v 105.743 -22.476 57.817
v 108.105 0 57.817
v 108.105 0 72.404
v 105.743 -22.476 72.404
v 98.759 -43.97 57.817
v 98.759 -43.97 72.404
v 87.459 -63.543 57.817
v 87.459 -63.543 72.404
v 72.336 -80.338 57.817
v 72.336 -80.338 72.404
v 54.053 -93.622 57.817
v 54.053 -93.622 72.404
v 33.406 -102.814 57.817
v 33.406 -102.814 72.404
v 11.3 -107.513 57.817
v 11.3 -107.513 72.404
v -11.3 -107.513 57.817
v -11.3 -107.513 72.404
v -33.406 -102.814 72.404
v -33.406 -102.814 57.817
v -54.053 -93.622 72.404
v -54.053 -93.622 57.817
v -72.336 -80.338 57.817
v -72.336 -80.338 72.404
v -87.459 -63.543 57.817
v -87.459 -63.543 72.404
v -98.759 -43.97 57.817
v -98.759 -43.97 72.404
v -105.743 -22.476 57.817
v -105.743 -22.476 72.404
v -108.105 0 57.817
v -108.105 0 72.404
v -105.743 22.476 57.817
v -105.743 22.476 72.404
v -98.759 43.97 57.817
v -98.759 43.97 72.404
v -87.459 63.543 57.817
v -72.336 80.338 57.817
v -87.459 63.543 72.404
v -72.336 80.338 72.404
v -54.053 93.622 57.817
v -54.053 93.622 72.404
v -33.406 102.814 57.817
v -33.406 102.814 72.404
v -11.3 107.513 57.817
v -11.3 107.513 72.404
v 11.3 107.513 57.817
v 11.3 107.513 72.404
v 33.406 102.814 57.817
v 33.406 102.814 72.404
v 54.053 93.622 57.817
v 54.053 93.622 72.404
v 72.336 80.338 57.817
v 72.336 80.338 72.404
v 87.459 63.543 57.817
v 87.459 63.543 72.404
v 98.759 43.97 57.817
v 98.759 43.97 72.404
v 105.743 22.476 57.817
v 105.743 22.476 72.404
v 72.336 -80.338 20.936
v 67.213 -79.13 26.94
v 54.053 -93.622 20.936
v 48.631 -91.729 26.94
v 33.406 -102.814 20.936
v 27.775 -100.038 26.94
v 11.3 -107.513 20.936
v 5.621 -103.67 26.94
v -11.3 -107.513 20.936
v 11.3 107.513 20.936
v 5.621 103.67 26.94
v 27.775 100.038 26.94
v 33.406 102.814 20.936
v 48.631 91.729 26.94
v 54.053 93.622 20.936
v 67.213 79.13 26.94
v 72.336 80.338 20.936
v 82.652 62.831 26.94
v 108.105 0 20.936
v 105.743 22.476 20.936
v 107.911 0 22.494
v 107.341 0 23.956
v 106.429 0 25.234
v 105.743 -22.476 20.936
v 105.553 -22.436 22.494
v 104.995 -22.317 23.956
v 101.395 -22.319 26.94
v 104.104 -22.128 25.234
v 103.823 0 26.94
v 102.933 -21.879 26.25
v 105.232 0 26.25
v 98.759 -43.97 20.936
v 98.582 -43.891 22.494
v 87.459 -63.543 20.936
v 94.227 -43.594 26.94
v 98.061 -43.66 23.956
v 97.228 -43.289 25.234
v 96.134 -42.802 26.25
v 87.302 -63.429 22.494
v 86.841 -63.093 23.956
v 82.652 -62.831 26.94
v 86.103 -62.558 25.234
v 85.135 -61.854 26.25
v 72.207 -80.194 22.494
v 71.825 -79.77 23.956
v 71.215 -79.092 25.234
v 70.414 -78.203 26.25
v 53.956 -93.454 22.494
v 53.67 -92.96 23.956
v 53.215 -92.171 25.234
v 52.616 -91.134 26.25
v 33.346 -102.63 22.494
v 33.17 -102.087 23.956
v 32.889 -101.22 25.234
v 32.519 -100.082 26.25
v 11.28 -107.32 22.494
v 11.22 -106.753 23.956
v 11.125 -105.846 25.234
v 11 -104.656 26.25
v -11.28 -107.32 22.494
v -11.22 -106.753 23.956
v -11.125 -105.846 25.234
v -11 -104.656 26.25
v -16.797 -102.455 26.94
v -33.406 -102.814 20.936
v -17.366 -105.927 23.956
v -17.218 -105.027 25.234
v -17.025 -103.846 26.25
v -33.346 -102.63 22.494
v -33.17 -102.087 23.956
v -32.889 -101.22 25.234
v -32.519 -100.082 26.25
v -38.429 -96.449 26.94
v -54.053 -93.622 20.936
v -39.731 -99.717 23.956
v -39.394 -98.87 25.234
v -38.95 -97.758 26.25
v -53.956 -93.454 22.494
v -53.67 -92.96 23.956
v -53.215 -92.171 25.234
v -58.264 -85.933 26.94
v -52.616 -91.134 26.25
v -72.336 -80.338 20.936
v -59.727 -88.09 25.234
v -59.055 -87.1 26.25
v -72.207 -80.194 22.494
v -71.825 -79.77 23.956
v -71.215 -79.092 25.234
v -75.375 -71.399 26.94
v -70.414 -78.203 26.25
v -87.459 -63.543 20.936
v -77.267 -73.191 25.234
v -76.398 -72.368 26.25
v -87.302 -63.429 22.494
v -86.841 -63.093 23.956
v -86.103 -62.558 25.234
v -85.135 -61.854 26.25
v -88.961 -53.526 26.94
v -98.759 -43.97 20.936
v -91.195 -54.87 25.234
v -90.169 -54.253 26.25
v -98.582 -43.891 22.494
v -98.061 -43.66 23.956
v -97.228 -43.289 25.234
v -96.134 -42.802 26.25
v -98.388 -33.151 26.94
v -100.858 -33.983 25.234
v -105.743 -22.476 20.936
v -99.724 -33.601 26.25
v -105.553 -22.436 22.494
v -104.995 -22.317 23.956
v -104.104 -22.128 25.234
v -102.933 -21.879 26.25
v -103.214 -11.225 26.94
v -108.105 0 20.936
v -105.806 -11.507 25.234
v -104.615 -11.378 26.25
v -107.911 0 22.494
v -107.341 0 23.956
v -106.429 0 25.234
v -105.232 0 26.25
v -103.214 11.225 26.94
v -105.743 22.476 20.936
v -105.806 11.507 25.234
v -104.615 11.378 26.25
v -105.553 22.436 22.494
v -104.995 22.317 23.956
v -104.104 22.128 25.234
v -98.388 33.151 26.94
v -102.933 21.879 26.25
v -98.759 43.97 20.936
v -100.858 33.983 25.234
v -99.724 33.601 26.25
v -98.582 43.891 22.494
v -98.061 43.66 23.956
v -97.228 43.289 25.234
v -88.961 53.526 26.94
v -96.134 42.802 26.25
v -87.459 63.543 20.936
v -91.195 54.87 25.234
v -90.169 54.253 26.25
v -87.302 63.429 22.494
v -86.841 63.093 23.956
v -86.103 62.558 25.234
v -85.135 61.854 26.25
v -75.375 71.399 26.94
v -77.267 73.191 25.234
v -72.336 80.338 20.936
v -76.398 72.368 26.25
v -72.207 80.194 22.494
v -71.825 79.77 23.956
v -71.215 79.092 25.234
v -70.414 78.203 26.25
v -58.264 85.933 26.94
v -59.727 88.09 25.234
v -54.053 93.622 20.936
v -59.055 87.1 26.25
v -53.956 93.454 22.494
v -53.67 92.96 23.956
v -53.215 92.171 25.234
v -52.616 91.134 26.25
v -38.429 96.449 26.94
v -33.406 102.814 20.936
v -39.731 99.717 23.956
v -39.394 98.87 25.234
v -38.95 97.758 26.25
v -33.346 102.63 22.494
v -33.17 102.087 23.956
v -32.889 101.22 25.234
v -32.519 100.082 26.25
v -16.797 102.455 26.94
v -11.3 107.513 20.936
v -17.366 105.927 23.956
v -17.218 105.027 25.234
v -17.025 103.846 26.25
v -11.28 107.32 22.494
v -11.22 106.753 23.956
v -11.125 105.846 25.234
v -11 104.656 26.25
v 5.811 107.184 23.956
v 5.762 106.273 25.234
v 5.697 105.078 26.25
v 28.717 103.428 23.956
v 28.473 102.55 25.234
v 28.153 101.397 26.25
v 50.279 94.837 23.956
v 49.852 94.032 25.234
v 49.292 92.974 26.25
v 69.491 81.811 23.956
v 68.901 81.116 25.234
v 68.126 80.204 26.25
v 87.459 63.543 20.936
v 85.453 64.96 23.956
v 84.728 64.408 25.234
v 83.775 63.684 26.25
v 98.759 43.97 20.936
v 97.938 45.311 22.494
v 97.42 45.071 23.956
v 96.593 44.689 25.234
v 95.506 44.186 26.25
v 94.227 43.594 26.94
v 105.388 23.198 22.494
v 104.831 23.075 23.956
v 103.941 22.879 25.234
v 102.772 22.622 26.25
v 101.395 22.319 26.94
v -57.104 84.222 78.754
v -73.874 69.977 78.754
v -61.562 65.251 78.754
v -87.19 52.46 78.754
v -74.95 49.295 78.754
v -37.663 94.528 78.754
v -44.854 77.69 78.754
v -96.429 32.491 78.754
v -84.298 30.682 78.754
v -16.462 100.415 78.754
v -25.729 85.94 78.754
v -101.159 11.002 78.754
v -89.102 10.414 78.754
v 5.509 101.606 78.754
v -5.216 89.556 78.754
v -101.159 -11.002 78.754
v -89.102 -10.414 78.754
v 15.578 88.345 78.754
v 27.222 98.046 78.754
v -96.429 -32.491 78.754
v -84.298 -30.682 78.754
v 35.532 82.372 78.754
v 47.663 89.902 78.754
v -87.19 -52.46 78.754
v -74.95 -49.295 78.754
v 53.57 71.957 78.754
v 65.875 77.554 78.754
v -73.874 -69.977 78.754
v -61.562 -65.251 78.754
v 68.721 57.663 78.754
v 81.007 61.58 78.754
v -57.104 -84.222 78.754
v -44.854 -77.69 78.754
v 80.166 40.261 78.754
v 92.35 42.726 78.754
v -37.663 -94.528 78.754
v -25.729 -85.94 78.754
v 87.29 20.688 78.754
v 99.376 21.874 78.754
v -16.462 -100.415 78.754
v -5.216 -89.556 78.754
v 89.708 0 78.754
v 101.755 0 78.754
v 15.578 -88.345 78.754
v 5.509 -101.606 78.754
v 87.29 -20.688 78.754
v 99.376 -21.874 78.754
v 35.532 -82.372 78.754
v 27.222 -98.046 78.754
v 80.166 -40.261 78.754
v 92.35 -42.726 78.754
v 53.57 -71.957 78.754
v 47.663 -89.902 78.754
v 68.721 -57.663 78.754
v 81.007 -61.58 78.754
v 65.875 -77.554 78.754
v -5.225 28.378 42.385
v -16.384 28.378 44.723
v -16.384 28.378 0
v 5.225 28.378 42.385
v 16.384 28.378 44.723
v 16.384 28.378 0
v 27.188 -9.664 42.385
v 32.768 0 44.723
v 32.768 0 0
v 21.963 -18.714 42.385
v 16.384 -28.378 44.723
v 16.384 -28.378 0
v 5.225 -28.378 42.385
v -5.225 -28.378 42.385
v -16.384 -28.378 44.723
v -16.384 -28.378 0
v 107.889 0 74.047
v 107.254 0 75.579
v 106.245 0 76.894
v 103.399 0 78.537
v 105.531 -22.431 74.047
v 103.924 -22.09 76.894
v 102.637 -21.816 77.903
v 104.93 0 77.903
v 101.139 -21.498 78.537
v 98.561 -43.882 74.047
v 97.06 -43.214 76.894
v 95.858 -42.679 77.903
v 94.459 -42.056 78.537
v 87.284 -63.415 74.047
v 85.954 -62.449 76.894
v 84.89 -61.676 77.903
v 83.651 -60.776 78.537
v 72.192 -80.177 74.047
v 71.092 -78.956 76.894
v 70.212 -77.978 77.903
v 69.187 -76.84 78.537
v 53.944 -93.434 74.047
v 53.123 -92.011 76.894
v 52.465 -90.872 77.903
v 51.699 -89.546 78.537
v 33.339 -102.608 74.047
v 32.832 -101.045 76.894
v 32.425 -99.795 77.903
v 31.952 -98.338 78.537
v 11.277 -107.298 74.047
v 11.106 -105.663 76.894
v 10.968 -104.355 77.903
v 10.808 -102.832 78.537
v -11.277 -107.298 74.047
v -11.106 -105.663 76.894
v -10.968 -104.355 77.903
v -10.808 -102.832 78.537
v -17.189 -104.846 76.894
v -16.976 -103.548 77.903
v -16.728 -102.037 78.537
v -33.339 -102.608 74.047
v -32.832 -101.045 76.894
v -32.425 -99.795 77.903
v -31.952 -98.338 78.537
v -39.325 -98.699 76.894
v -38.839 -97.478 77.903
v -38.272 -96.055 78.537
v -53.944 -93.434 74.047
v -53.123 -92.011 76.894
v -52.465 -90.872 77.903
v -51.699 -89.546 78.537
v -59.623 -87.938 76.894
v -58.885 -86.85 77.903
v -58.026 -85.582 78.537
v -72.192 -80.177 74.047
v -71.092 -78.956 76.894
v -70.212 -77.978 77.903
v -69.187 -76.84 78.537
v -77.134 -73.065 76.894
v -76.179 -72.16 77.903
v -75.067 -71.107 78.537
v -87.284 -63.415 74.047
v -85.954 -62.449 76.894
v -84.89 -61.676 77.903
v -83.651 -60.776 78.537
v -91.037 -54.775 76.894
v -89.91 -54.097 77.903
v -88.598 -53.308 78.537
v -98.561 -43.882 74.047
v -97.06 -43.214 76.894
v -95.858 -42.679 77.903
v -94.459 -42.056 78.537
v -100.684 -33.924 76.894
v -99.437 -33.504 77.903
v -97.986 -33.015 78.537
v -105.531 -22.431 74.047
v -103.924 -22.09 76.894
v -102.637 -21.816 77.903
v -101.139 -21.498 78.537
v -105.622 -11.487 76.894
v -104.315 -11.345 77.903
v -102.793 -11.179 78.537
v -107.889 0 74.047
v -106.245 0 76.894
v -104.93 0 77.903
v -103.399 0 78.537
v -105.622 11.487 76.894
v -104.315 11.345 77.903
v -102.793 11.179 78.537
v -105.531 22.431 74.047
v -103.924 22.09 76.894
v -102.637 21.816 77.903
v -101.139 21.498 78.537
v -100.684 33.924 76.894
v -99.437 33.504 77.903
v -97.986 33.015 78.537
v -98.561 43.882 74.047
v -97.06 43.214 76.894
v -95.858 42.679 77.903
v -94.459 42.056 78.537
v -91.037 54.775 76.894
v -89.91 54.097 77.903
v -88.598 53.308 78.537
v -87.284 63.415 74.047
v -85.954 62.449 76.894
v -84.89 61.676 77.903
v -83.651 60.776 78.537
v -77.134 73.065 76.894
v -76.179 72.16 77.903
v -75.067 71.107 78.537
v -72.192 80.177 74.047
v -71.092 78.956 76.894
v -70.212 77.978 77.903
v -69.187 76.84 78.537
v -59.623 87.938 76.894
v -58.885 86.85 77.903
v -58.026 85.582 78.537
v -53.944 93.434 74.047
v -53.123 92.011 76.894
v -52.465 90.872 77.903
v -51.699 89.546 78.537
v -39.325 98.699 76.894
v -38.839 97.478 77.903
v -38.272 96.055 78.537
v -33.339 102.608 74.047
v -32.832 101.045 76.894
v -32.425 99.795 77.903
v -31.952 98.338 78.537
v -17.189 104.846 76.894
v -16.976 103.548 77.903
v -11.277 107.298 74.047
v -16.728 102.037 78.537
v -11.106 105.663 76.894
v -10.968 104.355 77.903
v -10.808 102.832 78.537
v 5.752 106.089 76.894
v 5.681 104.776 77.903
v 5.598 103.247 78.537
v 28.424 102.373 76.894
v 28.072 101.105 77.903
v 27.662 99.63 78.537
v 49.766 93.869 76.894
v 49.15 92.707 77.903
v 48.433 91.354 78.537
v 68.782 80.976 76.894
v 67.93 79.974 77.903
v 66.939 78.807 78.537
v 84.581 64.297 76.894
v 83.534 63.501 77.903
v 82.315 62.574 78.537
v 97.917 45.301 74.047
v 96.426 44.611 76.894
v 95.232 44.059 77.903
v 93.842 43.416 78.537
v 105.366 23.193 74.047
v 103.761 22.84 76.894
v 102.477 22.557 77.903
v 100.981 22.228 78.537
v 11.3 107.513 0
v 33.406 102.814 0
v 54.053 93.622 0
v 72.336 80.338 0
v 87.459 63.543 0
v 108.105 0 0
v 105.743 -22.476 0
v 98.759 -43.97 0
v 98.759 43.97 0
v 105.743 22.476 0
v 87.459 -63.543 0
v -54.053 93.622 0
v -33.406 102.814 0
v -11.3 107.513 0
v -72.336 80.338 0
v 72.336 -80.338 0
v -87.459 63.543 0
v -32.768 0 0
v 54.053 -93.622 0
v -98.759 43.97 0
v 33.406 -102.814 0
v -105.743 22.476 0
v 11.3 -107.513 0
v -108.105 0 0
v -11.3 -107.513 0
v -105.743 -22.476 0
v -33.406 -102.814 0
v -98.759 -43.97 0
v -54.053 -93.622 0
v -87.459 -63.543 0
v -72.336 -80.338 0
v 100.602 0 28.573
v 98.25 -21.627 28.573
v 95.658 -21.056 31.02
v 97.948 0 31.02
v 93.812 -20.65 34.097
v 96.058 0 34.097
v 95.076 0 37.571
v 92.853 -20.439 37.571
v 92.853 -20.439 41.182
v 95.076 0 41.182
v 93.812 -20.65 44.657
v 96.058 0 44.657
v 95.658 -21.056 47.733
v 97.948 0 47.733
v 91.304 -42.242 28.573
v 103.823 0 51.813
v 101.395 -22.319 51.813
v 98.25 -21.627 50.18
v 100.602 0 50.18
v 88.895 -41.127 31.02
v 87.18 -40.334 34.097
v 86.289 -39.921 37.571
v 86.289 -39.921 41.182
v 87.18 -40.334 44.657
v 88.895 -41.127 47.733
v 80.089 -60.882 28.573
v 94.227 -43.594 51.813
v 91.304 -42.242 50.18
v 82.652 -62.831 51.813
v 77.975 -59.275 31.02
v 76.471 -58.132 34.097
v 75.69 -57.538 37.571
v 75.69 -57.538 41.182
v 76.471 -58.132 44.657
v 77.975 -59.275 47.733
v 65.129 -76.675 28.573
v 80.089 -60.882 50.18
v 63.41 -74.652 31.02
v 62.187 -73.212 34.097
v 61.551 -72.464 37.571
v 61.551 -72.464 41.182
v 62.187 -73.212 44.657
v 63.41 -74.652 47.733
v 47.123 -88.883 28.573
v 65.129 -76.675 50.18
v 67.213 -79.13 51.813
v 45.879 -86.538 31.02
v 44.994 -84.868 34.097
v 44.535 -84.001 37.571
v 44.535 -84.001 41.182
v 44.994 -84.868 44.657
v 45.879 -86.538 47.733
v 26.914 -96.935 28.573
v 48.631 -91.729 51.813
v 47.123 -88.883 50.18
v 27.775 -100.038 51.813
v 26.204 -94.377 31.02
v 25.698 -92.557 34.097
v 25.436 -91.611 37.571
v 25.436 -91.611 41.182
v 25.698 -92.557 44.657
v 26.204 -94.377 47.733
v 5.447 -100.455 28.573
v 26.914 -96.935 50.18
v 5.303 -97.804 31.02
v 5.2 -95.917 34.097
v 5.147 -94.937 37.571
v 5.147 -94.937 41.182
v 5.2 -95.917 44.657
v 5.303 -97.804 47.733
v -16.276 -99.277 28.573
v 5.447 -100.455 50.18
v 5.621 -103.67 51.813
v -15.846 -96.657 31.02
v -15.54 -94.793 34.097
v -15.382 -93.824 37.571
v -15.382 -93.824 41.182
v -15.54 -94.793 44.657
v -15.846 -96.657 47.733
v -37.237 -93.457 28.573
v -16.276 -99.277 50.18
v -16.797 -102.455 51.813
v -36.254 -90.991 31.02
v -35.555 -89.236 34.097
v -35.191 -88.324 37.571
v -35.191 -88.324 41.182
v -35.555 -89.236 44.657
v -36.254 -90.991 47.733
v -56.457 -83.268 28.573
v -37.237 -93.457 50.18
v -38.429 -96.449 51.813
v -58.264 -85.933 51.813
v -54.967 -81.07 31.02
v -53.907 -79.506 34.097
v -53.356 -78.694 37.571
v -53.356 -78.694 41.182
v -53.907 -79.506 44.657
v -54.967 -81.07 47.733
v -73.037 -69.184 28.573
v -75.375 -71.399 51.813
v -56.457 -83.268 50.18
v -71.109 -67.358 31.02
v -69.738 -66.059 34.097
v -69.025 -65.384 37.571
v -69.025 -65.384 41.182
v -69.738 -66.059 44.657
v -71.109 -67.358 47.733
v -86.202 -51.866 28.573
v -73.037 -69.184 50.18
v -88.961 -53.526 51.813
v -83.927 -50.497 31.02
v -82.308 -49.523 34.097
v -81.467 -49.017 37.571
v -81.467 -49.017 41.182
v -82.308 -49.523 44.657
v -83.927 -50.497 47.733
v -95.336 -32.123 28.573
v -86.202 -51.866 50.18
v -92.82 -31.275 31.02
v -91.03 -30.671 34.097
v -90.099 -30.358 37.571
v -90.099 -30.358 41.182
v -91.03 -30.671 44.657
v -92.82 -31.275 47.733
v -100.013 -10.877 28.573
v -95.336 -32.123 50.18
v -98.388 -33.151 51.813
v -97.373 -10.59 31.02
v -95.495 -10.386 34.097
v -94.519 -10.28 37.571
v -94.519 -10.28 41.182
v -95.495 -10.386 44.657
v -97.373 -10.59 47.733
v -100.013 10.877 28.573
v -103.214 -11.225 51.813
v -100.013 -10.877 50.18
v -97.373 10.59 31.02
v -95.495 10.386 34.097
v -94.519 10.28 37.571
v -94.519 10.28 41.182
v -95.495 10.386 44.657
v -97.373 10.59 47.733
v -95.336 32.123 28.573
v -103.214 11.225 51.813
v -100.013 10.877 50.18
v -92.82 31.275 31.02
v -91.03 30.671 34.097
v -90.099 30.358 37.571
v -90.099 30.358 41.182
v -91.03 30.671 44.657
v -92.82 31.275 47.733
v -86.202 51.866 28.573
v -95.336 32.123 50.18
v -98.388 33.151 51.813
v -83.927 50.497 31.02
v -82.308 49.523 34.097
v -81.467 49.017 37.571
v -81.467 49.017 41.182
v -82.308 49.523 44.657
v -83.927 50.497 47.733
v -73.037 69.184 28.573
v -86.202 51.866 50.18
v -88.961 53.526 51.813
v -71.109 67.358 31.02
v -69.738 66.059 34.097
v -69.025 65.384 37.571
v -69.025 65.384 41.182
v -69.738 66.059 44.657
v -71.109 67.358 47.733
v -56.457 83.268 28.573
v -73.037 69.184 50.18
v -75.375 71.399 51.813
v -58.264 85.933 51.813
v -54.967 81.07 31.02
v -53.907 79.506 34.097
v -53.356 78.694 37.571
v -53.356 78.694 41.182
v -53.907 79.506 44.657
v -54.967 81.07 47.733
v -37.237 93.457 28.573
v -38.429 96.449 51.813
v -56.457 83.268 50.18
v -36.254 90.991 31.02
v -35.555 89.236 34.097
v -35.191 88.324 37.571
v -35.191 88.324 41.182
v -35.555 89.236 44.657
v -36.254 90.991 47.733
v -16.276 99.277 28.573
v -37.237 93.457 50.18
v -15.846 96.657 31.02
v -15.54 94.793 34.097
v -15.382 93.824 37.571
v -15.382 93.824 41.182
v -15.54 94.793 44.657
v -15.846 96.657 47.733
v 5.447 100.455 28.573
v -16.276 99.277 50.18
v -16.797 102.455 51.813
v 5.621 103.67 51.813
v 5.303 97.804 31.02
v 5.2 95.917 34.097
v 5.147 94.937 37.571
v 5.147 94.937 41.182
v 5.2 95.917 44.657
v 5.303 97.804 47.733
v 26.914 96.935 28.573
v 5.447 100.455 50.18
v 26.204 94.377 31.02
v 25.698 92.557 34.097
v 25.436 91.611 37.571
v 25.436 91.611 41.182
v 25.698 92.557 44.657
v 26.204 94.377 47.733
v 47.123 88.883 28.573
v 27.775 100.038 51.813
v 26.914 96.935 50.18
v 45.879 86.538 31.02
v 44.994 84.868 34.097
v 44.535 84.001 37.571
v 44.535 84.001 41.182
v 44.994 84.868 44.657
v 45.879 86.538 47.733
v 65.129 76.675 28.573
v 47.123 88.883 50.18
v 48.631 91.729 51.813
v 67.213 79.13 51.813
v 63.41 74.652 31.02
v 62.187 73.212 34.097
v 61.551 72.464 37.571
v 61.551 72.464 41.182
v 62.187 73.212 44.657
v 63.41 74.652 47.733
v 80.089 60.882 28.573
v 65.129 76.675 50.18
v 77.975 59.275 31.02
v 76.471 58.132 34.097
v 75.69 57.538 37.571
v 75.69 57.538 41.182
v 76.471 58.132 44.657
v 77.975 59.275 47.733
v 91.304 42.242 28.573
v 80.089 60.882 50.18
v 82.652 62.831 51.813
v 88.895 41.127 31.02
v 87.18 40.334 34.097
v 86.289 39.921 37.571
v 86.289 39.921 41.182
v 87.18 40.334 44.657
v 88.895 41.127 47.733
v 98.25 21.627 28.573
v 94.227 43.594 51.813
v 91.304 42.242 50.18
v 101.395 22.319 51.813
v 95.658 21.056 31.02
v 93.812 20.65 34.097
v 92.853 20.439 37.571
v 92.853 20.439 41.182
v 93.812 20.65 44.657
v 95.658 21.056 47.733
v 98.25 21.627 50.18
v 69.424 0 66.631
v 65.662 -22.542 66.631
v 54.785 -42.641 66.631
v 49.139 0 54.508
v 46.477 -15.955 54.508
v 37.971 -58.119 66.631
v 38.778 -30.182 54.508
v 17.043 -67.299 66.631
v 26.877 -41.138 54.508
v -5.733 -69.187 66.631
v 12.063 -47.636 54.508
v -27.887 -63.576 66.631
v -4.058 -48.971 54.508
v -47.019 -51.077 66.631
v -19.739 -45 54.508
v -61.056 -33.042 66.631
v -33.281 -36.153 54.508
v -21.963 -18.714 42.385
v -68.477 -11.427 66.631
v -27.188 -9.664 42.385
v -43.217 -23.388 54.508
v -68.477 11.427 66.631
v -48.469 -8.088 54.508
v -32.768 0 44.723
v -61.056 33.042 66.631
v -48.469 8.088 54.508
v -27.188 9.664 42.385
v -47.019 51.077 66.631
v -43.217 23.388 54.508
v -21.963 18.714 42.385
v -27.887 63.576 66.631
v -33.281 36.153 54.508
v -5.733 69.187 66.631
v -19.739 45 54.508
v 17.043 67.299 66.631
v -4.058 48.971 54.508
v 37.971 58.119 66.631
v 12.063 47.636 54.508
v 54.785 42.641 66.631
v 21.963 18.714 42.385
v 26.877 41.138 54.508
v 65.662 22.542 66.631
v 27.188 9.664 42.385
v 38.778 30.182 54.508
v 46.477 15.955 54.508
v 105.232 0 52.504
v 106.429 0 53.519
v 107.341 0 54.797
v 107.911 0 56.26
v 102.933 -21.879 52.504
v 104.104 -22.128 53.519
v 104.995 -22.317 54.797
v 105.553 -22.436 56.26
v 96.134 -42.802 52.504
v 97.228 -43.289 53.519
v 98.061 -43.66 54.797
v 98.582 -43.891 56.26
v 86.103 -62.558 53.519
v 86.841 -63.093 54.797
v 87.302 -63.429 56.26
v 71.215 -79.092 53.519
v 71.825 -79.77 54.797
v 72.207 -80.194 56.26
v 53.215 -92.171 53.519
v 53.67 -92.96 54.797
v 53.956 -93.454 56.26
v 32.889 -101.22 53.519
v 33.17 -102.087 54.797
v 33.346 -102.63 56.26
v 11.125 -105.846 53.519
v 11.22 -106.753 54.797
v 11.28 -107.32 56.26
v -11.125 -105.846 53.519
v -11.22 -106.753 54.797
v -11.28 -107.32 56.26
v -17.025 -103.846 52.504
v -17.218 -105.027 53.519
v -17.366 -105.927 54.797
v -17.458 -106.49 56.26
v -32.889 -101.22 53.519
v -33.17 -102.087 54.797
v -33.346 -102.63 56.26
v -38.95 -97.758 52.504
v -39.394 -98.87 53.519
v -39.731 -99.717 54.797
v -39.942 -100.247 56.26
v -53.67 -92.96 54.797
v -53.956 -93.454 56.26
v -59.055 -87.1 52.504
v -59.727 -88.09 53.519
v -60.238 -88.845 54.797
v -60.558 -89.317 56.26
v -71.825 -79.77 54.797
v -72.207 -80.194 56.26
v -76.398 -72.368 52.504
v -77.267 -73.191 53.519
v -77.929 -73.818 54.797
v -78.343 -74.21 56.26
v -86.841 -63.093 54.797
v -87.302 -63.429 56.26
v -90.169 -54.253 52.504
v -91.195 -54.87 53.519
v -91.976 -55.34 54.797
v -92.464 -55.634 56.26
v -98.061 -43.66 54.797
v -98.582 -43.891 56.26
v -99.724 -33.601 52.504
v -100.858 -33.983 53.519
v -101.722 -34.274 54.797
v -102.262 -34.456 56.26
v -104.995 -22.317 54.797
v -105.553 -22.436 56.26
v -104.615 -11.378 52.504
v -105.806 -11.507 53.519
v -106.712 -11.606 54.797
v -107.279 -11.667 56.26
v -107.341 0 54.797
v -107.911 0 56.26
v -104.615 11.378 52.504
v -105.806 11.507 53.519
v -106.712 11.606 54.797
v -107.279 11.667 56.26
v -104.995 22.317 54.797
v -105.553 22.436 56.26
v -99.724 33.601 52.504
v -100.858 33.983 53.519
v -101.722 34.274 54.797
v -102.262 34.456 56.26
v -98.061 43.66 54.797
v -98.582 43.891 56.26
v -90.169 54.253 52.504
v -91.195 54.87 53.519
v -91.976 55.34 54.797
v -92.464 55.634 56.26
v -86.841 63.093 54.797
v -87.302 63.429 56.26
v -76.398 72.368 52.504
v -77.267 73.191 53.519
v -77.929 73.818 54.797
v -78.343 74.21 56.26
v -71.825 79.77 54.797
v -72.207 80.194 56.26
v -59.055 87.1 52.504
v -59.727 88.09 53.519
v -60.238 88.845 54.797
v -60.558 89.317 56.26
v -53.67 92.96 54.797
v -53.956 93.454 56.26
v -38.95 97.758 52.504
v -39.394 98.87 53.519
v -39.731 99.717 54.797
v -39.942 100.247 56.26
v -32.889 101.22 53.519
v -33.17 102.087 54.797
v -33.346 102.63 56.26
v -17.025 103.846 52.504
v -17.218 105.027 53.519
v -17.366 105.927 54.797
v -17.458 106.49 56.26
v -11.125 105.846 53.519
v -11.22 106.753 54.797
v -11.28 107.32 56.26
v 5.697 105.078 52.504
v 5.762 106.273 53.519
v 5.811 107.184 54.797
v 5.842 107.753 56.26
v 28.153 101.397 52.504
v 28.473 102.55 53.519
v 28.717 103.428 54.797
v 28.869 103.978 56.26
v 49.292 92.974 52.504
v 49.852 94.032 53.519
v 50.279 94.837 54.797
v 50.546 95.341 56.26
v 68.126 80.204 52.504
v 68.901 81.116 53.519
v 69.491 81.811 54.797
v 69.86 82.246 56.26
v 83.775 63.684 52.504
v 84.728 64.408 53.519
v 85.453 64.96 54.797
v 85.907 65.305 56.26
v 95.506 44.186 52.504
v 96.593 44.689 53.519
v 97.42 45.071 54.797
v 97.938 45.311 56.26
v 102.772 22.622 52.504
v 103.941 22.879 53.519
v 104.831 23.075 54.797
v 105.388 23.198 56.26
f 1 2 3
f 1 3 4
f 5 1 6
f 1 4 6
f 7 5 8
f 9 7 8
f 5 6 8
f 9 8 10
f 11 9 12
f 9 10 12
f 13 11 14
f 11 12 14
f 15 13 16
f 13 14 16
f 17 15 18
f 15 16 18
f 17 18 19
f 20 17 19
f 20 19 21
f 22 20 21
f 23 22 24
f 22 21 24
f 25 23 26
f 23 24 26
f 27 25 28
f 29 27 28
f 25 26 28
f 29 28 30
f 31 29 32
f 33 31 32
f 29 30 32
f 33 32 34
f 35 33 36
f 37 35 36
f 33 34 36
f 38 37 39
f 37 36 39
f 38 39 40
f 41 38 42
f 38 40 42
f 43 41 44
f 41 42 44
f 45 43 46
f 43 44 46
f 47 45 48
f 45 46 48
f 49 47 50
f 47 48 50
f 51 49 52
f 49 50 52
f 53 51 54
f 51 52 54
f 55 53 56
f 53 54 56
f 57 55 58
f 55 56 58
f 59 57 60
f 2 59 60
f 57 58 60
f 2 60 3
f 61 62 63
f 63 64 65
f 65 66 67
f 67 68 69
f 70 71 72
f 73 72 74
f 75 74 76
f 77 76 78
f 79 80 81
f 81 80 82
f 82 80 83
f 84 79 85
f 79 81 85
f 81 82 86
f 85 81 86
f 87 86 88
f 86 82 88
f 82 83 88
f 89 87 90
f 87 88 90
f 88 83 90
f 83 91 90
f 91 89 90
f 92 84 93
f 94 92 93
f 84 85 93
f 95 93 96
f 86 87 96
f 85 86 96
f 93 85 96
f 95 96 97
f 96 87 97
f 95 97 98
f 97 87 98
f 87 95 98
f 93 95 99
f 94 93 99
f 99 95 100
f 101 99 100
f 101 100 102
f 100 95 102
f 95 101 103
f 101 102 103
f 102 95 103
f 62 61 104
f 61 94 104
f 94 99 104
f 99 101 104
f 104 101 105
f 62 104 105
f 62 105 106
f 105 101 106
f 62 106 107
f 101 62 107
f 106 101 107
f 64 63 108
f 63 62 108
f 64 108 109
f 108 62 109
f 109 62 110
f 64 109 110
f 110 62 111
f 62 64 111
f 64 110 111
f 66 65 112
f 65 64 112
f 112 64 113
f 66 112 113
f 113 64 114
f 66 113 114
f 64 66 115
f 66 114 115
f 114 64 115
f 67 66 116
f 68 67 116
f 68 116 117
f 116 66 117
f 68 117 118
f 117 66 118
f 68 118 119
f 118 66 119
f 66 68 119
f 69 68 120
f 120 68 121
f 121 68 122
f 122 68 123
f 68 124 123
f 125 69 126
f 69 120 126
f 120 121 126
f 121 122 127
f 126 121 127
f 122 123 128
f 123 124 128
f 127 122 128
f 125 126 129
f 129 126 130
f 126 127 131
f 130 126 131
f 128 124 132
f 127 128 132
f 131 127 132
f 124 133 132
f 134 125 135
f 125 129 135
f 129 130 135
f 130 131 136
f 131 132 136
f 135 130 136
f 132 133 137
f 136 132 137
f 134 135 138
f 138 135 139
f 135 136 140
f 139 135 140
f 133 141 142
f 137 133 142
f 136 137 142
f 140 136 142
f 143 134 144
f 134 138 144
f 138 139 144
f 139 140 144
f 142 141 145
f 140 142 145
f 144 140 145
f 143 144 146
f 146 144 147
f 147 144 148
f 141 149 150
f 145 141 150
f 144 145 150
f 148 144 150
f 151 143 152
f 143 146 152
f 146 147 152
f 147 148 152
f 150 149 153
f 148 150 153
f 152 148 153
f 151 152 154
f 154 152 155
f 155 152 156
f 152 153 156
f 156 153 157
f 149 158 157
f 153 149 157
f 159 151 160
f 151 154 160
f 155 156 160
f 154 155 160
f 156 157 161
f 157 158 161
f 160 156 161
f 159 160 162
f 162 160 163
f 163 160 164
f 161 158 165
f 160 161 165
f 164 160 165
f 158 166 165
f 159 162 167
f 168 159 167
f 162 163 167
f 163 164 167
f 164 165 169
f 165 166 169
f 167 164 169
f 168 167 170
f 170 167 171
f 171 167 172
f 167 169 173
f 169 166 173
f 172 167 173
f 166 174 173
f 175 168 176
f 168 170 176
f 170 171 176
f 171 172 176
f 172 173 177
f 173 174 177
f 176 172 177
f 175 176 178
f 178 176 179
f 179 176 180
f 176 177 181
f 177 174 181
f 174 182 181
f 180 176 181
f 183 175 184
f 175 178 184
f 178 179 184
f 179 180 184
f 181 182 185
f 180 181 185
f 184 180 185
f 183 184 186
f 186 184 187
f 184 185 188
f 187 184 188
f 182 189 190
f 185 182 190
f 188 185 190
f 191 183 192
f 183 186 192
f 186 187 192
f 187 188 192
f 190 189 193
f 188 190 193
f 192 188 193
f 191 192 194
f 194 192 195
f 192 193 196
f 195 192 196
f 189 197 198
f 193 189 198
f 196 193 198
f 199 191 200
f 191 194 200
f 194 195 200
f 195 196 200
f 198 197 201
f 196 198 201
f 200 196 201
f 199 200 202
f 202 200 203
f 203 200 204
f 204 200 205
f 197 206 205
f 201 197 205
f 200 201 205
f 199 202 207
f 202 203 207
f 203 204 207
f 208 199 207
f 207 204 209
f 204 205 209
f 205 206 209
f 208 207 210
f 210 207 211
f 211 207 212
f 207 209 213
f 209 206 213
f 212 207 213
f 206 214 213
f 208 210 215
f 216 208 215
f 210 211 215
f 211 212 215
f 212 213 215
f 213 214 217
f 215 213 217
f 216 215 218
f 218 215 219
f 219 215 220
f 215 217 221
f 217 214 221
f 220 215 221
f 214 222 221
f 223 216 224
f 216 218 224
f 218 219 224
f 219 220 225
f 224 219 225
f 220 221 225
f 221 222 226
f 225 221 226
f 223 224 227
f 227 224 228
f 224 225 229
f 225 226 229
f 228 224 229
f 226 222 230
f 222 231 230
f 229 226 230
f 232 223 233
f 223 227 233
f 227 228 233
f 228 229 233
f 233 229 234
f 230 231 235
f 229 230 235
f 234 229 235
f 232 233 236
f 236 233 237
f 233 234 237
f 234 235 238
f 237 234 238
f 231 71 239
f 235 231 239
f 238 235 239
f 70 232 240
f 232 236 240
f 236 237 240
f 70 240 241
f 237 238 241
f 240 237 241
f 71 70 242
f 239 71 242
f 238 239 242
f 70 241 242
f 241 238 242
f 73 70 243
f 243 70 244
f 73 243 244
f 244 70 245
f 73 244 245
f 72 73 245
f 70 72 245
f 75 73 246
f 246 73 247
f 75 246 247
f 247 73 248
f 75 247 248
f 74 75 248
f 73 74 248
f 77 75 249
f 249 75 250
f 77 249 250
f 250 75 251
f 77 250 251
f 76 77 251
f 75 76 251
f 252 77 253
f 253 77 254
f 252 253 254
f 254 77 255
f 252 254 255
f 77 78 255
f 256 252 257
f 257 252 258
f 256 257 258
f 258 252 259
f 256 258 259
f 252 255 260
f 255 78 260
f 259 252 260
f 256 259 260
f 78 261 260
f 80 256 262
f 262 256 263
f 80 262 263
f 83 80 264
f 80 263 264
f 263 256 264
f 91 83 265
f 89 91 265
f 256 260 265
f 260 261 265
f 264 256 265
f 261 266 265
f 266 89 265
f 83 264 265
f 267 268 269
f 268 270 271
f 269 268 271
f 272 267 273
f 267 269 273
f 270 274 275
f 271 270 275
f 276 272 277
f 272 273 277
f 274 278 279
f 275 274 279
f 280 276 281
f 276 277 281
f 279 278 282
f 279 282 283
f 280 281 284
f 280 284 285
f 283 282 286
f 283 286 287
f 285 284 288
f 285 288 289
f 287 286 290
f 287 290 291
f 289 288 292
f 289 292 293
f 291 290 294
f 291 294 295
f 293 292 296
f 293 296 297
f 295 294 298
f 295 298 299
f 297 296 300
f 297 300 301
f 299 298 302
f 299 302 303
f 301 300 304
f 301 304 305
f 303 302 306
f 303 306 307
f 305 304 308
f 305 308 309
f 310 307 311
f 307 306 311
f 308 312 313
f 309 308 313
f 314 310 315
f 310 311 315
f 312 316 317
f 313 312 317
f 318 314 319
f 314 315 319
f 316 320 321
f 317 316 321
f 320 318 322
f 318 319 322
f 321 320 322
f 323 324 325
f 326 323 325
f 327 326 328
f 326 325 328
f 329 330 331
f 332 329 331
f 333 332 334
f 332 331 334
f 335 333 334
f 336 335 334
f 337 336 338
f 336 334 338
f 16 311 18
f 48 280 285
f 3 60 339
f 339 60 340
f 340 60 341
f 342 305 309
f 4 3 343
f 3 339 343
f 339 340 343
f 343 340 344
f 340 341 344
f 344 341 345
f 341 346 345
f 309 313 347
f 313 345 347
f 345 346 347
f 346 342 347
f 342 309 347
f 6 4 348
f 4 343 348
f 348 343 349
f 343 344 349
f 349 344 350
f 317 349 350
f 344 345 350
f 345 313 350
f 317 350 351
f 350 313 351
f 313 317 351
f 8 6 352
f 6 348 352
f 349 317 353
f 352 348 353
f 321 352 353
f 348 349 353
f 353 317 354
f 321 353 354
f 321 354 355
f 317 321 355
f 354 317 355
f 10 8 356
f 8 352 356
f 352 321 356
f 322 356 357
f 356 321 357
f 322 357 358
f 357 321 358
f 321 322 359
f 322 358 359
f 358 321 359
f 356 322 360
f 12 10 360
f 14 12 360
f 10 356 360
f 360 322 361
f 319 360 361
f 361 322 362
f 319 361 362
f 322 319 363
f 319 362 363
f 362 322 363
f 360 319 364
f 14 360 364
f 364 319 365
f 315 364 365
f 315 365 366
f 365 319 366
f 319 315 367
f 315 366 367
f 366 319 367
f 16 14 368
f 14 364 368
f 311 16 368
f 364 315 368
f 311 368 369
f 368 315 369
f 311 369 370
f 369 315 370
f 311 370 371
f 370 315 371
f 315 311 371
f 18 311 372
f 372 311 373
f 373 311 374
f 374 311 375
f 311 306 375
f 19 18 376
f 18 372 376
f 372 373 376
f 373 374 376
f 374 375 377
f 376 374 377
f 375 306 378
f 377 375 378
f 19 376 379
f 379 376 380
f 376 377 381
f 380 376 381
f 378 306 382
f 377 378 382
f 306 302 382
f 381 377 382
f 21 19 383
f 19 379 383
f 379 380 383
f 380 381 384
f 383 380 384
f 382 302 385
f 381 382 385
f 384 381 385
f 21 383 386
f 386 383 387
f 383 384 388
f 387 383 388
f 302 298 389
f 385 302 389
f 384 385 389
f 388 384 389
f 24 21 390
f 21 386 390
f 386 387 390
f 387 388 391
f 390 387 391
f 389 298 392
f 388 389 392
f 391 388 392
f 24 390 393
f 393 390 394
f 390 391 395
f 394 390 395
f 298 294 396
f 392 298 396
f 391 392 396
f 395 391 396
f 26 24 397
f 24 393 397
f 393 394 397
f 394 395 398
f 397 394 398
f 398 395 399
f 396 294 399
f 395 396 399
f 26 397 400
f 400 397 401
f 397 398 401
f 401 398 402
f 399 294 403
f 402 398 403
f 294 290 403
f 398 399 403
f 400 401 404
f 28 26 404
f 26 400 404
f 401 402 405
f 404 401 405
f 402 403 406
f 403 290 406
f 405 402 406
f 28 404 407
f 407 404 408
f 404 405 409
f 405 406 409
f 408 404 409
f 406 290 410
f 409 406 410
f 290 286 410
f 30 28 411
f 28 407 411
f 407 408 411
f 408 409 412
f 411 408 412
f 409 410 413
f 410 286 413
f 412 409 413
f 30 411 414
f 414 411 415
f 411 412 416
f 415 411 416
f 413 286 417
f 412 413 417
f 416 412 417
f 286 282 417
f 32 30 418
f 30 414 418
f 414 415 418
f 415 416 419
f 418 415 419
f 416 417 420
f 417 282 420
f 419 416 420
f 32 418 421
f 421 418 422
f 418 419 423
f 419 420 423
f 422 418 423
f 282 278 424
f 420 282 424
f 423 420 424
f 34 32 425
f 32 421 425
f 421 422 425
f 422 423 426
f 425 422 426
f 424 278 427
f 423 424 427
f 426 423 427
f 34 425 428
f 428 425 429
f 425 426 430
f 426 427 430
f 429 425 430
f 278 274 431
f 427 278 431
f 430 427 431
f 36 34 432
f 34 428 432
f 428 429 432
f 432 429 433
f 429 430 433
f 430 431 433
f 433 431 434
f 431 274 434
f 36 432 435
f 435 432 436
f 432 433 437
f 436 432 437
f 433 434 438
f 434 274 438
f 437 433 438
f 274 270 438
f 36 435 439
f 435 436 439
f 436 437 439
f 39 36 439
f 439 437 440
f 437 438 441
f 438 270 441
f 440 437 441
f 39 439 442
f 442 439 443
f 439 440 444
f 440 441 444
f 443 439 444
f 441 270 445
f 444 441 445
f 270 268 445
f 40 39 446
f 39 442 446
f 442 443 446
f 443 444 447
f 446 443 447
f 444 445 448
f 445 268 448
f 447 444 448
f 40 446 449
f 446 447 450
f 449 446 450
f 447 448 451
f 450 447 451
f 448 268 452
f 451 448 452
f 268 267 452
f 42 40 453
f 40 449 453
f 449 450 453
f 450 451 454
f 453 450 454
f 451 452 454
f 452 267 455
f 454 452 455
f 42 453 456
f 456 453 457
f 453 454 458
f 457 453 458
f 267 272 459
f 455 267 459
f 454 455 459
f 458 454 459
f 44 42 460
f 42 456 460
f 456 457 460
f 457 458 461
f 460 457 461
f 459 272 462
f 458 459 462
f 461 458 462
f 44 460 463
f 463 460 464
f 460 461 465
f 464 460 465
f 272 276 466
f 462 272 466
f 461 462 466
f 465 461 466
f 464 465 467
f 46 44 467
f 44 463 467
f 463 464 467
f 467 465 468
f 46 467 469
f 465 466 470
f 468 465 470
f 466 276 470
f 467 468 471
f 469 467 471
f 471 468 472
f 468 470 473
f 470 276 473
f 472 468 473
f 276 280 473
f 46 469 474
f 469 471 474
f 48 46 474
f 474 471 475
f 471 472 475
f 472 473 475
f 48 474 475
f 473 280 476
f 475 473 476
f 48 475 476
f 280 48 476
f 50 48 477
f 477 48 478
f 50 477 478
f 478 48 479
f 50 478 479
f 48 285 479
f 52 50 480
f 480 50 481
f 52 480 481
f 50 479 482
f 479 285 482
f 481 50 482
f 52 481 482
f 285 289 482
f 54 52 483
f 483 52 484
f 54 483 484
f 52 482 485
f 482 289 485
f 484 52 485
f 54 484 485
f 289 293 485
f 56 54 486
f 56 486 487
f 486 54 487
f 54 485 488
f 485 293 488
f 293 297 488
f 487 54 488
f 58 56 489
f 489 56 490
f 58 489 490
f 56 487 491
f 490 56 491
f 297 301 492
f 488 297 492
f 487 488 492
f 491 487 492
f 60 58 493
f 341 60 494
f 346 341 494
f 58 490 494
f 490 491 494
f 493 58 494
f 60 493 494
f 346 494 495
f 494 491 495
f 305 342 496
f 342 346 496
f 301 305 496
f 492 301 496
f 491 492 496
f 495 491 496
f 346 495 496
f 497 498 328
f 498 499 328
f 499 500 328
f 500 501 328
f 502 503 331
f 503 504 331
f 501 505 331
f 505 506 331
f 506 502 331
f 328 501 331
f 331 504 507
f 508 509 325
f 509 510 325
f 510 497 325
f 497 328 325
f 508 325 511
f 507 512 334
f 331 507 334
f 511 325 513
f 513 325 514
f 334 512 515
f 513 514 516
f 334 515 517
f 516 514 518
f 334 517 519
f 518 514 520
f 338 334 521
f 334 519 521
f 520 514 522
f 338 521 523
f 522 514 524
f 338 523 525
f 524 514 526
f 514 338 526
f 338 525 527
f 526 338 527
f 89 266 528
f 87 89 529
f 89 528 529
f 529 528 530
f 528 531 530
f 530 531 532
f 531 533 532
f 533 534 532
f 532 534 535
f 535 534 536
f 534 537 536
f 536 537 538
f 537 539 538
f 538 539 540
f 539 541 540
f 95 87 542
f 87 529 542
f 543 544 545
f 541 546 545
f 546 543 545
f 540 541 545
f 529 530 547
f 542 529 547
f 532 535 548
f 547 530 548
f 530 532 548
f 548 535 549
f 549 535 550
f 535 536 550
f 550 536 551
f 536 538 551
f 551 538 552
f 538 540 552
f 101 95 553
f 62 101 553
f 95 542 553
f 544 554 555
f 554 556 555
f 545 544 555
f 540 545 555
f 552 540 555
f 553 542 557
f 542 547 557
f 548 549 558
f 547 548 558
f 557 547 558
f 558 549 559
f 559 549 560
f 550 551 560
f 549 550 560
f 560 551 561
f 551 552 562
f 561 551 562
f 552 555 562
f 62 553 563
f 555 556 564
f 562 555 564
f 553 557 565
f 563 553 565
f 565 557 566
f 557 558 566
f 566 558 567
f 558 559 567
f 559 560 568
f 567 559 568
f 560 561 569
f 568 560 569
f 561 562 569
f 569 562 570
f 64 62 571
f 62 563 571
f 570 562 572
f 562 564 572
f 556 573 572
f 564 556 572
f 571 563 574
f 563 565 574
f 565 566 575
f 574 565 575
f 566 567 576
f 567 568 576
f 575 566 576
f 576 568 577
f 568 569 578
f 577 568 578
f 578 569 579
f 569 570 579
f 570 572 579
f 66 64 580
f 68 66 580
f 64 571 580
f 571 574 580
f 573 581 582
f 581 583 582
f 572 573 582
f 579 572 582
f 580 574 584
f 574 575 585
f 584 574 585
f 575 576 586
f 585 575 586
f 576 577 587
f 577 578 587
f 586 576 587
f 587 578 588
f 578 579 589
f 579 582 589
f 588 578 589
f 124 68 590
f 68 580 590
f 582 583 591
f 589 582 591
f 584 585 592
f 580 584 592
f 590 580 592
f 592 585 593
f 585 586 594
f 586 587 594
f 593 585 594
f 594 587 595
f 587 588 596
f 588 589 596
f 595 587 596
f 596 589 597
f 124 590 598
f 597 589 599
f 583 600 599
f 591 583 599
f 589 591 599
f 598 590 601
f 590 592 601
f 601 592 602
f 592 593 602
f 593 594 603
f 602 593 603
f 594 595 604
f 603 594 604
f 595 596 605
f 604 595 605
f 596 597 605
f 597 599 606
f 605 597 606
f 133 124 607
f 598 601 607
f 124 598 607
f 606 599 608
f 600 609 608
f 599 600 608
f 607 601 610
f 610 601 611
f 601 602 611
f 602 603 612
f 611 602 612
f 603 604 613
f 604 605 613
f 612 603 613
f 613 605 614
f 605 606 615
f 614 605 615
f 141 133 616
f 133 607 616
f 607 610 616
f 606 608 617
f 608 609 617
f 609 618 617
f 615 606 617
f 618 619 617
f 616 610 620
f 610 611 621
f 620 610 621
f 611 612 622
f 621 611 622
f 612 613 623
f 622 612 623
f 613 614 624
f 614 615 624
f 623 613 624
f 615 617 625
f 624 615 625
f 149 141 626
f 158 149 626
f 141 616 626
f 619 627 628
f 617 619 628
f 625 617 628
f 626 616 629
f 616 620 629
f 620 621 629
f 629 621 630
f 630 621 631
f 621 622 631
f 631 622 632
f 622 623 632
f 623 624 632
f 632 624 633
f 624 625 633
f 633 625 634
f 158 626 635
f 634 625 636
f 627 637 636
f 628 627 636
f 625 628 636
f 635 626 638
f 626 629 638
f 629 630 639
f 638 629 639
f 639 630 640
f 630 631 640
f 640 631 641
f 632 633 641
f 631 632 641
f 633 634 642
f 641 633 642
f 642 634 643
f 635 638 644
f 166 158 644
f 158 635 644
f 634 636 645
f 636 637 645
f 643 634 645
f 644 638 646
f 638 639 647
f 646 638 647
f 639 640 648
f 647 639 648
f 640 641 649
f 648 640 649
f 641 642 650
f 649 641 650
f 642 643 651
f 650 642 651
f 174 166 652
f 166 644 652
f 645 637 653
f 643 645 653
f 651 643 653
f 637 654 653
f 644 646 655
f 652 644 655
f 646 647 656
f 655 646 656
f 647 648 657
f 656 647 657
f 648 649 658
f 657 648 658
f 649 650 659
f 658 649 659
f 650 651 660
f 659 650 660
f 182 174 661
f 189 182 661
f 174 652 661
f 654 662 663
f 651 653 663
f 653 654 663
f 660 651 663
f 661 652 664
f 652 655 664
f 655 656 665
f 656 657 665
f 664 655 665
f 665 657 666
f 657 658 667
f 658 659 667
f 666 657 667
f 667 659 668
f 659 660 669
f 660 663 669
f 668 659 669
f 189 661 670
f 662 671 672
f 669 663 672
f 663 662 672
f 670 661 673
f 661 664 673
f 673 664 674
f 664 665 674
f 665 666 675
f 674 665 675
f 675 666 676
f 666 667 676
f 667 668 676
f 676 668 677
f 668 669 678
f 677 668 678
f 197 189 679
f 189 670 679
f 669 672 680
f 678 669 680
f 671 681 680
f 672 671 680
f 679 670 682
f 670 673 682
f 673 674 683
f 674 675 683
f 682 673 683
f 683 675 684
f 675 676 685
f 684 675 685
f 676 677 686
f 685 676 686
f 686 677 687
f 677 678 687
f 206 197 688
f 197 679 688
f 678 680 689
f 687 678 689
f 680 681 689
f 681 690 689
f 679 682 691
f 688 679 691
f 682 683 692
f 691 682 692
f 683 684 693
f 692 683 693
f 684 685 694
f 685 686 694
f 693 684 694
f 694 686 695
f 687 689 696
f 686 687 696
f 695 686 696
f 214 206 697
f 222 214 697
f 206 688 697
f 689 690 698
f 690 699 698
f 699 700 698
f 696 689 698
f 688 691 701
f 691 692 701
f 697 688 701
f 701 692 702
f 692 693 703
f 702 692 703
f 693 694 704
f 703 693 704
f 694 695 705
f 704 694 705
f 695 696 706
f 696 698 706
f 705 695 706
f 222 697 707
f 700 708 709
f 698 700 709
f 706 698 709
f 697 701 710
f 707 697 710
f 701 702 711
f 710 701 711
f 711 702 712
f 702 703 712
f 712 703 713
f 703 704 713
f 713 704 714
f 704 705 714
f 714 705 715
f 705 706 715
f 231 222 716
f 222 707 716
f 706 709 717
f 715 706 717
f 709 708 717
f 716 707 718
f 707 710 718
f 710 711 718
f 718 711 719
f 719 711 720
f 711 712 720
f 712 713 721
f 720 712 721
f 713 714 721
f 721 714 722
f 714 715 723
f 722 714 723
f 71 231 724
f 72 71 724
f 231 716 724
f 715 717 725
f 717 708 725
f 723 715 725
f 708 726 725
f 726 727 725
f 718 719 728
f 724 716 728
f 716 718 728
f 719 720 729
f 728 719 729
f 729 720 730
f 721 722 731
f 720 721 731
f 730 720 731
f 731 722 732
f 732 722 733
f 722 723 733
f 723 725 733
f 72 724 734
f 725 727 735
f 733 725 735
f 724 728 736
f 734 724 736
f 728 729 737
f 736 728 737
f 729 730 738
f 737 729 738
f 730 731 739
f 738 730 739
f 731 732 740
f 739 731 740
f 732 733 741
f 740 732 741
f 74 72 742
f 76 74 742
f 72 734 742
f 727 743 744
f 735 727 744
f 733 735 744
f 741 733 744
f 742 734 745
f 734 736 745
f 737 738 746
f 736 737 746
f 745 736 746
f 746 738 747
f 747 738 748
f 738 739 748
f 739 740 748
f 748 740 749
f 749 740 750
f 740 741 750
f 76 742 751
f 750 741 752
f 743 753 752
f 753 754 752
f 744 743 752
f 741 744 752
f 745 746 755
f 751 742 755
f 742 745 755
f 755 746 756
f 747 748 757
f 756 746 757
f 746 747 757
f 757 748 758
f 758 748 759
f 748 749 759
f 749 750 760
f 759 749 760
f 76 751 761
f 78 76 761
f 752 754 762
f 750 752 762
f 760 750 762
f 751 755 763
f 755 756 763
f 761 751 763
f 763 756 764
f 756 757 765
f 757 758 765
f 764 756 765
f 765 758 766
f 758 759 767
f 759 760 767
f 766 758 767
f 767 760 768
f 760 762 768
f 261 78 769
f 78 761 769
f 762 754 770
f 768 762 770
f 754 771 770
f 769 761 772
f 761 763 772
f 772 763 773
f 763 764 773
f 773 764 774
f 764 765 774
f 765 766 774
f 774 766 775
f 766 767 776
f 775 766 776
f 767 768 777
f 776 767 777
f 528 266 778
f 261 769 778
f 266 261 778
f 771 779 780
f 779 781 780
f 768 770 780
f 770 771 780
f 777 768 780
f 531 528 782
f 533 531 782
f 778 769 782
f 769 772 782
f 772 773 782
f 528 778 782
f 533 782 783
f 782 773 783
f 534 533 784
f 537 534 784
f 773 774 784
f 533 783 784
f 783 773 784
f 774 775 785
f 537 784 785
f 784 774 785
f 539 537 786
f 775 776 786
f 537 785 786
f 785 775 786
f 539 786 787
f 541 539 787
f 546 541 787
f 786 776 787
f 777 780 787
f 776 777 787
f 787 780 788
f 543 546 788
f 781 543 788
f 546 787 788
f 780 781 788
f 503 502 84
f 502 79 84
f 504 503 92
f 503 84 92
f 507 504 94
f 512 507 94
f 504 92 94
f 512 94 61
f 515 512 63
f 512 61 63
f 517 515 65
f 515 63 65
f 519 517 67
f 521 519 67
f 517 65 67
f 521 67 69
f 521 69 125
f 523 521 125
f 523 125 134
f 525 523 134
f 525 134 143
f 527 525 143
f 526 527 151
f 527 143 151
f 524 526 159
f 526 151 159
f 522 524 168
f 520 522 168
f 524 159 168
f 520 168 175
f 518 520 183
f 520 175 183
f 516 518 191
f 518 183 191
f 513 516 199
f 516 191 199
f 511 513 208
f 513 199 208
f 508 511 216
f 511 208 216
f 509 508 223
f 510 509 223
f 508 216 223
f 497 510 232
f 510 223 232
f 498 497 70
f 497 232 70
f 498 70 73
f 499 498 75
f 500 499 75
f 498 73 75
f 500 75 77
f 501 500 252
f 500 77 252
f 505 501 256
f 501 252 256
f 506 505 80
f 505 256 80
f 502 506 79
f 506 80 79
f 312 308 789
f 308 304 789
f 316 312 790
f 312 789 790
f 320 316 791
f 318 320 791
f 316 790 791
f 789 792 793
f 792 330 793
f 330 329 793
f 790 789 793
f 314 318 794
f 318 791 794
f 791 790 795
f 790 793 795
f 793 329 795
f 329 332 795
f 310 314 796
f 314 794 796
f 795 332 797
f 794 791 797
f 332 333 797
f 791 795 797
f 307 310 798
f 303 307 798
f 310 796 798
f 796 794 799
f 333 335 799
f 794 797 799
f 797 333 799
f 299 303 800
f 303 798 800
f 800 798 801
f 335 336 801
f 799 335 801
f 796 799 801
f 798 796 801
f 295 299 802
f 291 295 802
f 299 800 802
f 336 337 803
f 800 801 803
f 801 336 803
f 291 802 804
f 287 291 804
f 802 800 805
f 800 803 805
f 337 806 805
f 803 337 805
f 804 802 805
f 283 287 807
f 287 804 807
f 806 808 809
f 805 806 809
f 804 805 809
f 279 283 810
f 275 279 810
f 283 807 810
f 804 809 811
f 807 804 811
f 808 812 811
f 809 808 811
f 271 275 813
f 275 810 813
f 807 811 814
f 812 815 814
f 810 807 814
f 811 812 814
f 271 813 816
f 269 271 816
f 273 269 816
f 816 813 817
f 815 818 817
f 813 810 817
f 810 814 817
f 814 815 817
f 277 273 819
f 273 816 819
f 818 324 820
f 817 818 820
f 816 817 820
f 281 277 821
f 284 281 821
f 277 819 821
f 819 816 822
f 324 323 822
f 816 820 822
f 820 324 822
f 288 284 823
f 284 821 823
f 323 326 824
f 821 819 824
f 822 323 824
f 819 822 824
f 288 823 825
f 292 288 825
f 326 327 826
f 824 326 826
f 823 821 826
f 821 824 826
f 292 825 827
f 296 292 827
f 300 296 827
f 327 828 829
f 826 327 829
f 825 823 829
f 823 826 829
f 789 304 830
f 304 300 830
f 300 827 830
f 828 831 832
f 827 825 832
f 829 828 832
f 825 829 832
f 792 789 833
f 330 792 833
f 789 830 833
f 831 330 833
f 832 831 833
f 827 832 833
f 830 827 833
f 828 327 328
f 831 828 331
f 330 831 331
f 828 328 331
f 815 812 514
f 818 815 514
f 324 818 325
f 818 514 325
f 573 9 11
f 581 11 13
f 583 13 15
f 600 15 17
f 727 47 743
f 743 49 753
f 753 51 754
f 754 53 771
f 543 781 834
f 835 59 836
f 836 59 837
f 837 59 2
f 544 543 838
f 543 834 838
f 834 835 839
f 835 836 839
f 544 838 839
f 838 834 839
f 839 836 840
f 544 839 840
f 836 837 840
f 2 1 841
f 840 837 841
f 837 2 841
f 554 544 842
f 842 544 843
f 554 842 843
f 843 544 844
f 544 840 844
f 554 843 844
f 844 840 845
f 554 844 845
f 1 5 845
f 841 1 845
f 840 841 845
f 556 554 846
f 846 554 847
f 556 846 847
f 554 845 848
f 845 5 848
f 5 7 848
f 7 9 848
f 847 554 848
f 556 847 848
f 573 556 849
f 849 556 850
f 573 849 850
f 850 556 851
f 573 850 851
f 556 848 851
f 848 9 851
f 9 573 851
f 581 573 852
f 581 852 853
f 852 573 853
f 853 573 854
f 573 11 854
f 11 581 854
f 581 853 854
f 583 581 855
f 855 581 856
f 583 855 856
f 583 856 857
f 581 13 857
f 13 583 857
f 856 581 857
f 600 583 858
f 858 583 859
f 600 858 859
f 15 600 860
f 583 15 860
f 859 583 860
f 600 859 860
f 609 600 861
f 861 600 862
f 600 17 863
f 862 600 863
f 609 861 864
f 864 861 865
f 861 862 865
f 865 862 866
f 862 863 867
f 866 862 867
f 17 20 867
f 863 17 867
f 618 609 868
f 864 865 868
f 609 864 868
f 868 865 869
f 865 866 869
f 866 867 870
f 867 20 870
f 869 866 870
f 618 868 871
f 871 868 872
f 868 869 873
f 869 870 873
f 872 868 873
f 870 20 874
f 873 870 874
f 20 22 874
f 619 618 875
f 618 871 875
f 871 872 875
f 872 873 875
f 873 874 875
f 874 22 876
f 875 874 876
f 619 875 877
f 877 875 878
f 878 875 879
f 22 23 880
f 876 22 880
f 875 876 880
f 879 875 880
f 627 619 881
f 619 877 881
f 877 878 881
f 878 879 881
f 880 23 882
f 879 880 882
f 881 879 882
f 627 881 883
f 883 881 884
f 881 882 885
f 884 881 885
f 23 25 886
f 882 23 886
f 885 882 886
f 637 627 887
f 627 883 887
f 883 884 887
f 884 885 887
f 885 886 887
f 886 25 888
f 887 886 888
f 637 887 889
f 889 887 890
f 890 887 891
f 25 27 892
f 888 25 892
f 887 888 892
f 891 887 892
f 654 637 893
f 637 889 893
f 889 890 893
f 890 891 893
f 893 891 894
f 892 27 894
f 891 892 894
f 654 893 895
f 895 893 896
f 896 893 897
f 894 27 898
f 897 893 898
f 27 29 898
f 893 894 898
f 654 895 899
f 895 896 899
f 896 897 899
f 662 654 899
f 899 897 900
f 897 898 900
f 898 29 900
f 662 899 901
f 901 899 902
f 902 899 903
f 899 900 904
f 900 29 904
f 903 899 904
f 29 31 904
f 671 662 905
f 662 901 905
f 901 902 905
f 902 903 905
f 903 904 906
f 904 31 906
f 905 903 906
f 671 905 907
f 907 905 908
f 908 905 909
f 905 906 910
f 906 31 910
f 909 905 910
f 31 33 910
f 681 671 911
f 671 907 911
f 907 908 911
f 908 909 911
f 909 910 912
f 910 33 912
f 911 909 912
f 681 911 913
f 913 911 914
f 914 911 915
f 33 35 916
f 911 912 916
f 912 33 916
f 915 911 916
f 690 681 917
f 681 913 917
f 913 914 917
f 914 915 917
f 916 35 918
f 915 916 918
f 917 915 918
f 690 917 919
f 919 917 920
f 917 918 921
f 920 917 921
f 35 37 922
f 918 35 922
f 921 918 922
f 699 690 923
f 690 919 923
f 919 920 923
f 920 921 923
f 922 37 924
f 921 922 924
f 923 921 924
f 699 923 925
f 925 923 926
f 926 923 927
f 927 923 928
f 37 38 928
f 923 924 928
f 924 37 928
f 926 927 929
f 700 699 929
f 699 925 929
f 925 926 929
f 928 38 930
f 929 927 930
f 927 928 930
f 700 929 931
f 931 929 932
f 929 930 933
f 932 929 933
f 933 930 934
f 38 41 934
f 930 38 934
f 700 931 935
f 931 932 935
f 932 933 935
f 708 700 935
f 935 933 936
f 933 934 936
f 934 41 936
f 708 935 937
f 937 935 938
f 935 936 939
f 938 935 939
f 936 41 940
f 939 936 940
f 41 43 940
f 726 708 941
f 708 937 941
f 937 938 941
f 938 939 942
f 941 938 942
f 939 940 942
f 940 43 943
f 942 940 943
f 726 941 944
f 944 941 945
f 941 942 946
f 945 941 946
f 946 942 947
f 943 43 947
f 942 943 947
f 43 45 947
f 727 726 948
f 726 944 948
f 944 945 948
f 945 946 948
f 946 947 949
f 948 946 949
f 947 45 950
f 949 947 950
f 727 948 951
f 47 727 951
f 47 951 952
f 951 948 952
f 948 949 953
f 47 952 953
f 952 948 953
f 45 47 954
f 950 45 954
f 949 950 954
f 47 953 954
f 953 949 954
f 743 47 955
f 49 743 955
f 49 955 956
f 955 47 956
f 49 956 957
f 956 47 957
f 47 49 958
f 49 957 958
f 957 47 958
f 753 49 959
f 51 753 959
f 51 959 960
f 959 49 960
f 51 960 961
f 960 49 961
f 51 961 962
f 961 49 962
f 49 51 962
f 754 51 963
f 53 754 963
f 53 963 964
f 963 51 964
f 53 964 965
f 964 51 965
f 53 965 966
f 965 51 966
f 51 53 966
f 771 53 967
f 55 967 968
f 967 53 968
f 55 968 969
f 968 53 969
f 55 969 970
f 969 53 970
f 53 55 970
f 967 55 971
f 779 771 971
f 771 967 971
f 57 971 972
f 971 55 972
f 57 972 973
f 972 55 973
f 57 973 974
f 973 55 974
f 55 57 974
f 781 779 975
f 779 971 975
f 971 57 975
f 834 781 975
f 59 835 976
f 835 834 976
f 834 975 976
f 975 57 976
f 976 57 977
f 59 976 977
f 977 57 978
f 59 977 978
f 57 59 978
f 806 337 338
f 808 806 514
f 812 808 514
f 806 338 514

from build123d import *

# Parameters (mm, degrees)
F3_DEPTH = 175.35396


with BuildPart() as f1:
    # F0 (on Front) → F1 (revolve)
    with BuildSketch(Plane.XZ):
        with BuildLine():
            Line((0, 21.537127), (0, 0))
            Line((0, 0), (108.105168, 0))
            Line((108.105168, 0), (108.105168, 20.936103))
            ThreePointArc((108.105168, 20.936103), (106.924834, 24.623521), (103.822632, 26.940109))
            ThreePointArc((103.822632, 26.940109), (94.951811, 39.376777), (103.822632, 51.813444))
            ThreePointArc((103.822632, 51.813444), (106.924834, 54.130032), (108.105168, 57.81745))
            Line((108.105168, 57.81745), (108.105168, 72.403553))
            ThreePointArc((108.105168, 72.403553), (106.245296, 76.893681), (101.755168, 78.753553))
            Line((101.755168, 78.753553), (89.708269, 78.753553))
            Line((89.708269, 78.753553), (3.092389, 26.987858))
            ThreePointArc((3.092389, 26.987858), (0.826942, 24.670549), (0, 21.537127))
        make_face()
    revolve(axis=Axis((0, 0, 17.780939), (0, 0, -1)))

    # F2 (on face) → F3 (cut)
    with BuildSketch(Plane(origin=(0, 0, 0), x_dir=(1, 0, 0), z_dir=(0, 0, -1))):
        Polygon((16.383819, 28.377607), (-16.383819, 28.377607), (-32.767639, 0), (-16.383819, -28.377607), (16.383819, -28.377607), (32.767639, 0), align=None)
    extrude(amount=-F3_DEPTH, mode=Mode.SUBTRACT)


solid = f1.part
